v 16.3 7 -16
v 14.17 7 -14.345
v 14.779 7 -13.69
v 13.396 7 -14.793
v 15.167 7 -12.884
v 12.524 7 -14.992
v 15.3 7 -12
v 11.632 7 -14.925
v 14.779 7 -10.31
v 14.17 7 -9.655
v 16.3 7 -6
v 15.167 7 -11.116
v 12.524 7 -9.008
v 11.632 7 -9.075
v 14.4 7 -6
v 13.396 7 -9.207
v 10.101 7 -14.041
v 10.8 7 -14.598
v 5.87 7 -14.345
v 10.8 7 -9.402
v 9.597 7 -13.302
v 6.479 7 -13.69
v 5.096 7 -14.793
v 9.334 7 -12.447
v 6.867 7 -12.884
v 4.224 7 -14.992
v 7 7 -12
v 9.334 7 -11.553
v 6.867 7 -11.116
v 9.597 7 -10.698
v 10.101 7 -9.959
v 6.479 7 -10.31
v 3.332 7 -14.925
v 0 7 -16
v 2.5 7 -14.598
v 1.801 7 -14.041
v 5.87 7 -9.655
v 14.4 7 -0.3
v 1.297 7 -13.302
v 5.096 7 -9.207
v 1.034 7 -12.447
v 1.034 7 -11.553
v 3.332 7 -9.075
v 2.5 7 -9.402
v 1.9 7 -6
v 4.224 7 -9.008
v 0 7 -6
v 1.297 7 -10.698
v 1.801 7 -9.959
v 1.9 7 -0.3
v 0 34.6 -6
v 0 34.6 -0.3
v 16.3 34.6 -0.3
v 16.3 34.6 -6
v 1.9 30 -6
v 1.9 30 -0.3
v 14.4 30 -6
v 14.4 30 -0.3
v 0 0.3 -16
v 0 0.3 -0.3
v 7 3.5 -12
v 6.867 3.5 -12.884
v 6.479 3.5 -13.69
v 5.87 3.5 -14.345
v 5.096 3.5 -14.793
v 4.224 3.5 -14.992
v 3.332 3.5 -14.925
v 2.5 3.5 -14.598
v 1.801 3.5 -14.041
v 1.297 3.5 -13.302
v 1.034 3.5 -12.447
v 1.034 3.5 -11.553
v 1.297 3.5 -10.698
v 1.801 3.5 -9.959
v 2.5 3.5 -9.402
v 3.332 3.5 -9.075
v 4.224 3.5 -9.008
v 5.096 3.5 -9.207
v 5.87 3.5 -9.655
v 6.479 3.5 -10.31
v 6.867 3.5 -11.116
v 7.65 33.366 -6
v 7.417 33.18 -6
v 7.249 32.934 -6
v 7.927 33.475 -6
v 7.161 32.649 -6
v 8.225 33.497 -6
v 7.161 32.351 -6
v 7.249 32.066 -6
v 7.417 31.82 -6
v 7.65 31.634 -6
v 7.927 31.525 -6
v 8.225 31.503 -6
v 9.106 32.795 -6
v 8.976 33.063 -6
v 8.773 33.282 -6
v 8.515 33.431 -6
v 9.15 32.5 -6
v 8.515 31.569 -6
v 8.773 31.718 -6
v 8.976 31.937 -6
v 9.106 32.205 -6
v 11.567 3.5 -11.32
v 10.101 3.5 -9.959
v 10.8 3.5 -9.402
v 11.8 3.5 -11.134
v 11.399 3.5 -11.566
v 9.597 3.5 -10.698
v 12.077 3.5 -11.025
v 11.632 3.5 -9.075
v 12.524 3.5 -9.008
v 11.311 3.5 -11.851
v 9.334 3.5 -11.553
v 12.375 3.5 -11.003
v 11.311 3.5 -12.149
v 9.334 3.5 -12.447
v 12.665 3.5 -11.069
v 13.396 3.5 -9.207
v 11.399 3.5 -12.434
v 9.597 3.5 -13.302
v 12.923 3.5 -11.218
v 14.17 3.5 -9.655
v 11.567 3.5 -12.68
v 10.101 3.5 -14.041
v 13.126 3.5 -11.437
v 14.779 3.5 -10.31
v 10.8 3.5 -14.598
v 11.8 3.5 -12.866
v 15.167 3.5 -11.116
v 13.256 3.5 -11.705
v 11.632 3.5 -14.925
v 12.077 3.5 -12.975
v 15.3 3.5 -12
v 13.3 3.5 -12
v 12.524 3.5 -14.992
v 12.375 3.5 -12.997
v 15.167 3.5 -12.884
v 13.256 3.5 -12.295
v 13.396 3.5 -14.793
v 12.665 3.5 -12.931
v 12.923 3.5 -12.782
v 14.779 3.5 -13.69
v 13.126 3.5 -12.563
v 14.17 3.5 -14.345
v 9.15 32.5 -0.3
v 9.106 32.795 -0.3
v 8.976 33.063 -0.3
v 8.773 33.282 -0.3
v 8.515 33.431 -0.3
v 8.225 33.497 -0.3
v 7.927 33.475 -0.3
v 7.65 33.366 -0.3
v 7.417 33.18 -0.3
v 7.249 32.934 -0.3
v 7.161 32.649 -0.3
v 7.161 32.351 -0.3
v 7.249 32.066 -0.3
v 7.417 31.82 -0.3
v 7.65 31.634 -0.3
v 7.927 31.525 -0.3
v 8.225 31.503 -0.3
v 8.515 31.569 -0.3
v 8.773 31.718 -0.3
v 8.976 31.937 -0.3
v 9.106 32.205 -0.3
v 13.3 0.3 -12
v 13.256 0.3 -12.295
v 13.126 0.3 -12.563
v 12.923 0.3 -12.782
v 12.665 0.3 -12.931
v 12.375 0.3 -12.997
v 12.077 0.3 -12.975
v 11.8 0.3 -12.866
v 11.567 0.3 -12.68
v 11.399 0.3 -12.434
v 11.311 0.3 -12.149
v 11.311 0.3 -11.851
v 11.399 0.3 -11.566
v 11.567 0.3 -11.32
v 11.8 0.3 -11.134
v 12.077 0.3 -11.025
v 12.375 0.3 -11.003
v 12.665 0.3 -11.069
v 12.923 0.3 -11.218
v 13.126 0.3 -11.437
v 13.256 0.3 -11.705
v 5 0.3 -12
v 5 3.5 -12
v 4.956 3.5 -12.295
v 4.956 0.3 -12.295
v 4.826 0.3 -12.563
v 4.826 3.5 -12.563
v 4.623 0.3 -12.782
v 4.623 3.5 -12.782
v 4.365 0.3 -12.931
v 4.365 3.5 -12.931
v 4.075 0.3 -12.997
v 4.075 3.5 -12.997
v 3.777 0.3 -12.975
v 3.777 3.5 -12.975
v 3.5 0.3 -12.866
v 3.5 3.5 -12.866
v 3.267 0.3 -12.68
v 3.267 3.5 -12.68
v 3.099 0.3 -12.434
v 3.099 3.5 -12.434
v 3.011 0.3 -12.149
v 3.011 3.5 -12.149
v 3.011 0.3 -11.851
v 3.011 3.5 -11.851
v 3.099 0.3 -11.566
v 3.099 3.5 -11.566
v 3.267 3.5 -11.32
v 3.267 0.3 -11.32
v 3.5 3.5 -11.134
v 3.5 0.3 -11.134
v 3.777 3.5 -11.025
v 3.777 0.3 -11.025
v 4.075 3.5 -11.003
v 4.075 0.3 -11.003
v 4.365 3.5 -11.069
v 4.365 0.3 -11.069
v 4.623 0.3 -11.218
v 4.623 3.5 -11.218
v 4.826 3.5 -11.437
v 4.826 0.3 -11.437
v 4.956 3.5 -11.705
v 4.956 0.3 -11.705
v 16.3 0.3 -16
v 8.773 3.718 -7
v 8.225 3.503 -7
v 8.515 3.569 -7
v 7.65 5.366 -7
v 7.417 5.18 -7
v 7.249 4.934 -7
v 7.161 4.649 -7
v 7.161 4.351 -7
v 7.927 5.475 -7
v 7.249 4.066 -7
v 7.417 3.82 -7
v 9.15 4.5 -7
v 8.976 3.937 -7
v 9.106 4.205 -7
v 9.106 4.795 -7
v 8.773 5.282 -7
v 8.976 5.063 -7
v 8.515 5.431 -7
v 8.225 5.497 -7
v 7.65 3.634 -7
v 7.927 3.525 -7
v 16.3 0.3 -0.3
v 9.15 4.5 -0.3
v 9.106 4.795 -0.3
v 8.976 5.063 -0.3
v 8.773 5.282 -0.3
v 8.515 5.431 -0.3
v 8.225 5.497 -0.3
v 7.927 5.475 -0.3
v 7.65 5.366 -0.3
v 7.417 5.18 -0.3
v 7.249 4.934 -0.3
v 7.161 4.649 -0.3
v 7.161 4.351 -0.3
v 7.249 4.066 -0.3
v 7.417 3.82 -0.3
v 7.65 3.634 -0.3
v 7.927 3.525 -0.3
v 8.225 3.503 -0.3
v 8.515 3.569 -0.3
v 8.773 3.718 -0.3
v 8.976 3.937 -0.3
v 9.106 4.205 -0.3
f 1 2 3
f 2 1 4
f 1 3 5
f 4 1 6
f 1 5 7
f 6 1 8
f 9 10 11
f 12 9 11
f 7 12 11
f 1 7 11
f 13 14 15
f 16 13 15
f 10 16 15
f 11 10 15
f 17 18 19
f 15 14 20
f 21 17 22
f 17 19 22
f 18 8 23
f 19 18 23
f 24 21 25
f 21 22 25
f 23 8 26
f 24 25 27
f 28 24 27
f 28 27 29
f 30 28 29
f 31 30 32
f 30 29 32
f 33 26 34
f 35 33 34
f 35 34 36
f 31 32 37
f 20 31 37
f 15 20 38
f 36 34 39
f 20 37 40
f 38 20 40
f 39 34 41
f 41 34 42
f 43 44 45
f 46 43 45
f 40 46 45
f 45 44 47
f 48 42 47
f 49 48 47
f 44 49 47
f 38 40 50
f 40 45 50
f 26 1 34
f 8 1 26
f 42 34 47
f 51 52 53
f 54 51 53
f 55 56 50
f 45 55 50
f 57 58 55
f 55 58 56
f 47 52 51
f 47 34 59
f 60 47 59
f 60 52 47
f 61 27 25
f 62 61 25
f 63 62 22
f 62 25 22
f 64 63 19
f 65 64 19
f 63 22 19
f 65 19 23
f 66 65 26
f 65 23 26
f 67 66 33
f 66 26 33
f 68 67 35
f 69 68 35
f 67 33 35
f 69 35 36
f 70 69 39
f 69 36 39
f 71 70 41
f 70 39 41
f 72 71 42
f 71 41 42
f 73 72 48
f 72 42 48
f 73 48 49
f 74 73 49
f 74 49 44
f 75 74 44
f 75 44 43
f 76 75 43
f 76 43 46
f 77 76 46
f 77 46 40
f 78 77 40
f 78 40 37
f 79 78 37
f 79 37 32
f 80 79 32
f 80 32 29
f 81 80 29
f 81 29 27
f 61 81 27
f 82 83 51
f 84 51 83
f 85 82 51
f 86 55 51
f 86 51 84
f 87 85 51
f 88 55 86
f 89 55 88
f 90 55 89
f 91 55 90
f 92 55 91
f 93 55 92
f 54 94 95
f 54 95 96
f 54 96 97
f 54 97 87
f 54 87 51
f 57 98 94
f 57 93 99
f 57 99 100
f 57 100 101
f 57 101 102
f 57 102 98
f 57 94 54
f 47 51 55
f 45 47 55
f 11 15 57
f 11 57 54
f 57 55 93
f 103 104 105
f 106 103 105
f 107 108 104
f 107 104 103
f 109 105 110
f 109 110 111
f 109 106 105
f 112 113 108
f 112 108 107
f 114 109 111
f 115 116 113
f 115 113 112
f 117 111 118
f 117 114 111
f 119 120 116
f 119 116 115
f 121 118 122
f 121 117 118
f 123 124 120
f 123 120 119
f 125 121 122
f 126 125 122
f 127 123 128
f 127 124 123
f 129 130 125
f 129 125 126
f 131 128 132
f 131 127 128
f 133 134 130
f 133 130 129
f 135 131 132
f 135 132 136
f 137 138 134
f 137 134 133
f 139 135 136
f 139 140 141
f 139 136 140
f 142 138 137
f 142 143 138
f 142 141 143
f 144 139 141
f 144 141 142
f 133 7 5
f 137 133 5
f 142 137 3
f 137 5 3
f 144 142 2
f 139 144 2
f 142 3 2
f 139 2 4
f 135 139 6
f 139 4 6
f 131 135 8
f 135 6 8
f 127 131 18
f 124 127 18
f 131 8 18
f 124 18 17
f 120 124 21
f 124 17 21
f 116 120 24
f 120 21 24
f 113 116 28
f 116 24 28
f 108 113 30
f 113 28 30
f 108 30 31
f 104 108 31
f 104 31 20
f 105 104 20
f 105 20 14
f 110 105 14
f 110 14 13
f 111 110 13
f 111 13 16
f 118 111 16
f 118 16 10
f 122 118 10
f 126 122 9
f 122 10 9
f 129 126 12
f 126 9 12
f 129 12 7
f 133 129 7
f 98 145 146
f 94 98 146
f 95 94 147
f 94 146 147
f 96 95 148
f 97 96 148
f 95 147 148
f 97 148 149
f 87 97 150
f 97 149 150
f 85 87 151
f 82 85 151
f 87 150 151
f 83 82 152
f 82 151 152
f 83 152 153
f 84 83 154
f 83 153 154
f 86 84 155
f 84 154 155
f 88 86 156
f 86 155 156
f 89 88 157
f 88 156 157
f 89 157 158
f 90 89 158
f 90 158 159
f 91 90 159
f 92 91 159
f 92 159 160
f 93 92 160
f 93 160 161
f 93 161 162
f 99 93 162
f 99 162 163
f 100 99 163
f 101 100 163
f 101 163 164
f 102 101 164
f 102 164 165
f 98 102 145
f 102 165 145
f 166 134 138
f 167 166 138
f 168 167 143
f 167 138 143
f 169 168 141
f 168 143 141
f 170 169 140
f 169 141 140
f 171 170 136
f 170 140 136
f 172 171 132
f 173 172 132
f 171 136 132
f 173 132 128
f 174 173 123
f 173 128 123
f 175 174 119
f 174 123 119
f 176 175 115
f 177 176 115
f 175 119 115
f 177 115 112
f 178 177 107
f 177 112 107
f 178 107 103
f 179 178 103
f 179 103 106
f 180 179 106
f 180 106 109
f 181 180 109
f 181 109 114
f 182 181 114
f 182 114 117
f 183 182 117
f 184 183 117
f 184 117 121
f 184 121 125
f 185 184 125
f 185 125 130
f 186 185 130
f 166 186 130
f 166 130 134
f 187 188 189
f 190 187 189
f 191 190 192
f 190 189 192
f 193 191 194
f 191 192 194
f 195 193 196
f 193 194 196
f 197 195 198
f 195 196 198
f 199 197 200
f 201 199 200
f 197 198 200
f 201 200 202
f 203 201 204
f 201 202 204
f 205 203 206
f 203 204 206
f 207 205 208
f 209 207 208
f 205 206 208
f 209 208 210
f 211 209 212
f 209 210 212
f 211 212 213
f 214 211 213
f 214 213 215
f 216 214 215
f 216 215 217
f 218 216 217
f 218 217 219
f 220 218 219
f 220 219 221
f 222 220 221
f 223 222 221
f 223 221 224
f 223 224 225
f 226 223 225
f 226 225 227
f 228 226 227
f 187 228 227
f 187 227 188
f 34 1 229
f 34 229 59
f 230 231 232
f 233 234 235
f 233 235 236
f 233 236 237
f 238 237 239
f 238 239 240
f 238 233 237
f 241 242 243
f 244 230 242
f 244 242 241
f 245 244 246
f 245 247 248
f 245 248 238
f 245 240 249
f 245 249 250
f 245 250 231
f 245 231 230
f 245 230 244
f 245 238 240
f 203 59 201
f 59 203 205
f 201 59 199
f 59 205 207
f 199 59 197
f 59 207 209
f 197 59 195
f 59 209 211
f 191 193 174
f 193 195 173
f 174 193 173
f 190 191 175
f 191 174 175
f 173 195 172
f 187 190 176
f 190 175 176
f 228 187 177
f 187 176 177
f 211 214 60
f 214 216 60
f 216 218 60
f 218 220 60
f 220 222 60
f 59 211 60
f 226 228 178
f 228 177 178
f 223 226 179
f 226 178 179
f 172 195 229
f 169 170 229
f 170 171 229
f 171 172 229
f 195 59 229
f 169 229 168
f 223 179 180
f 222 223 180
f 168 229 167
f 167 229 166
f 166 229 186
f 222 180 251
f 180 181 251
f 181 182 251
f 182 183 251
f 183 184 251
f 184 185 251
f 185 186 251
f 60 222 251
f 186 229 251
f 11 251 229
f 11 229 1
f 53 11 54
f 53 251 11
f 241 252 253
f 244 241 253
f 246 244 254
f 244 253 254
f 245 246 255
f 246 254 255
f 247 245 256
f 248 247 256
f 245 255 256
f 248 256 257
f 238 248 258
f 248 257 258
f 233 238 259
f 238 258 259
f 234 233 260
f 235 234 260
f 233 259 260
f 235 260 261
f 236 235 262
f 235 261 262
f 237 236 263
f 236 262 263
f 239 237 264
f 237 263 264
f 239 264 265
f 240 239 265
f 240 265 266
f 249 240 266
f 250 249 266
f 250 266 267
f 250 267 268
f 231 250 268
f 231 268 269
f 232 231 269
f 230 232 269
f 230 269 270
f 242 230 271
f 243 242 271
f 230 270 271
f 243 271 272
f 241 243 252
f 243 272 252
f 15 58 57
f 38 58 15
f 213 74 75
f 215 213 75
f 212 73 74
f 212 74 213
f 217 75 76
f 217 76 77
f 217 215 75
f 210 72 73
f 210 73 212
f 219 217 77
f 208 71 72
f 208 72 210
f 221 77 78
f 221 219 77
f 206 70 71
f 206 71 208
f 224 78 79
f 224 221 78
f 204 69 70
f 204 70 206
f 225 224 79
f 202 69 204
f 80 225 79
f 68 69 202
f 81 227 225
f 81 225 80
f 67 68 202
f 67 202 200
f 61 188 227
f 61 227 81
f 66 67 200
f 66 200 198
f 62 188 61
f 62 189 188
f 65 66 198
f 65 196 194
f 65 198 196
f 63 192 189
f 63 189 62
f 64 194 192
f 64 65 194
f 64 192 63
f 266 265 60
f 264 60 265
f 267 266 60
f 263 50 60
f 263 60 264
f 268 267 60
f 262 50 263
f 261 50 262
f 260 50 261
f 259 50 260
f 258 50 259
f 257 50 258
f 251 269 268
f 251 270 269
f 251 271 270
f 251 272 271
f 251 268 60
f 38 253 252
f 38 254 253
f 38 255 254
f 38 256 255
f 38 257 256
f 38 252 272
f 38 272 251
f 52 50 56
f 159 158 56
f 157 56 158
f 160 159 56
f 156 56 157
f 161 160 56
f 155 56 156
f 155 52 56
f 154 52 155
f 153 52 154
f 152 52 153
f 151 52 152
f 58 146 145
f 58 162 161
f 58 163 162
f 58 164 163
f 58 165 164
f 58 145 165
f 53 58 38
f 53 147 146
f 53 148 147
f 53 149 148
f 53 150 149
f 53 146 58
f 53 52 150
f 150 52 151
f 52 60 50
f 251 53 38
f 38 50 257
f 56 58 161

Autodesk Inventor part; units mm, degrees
ref_plane "YZ Plane" through (0, 0, 0) normal (1, 0, 0) x (0, 1, 0)
ref_plane "XZ Plane" through (0, 0, 0) normal (0, 1, 0) x (-1, 0, 0)
ref_plane "XY Plane" through (0, 0, 0) normal (0, 0, 1) x (1, 0, 0)
sketch "Sketch1" plane through (0, 0, 0) normal (1, 0, 0) x (0, 1, 0)
  line L0 (34.6, 0) -> (0, 0)
  line L1 (0, 0) -> (0, -40)
  line L2 (7, -40) -> (7, -5)
  line L3 (7, -5) -> (34.6, -5)
  line L4 (34.6, -5) -> (34.6, 0)
  line L5 (7, -40) -> (0, -40)
  dimension "d0" = 0
  dimension "d1" = 0
  dimension "d2" = 5
  dimension "d3" = 7
  dimension "d5" = 40
  dimension "d6" = 34.6
extrude "Extrusion1" add sketch "Sketch1" along normal blind 16.3
sketch "Sketch2" plane through (0, 7, -5) normal (0, 1, 0) x (1, 0, 0)
  circle A0 centre (8.15, 20) radius 1.5
  line L0 (16.3, 35) -> (16.3, 0) projected
  line L1 (0, -5) -> (16.3, -5) projected
  circle A1 centre (8.15, 28) radius 1.5
  line L2 (8.15, 20) -> (8.15, 28) construction
  dimension "d9" = 8.15
  dimension "d10" = 25
  dimension "d11" = 3
  dimension "d31" = 3
  dimension "d32" = 8
extrude "Extrusion2" cut sketch "Sketch2" against normal through all
sketch "Sketch3" plane through (0, 7, -5) normal (0, 0, -1) x (-1, 0, 0)
  line L0 (0, 0) -> (-16.3, 0) projected
  line L1 (-14.4, 0) -> (-1.9, 0)
  line L2 (-1.9, 0) -> (-1.9, 23)
  line L3 (-1.9, 23) -> (-14.4, 23)
  line L4 (-14.4, 23) -> (-14.4, 0)
  line L5 (0, 0) -> (0, 27.6) projected
  point P0 (0, -7)
  dimension "d14" = 23
  dimension "d15" = 12.5
  dimension "d16" = 1.9
extrude "Extrusion3" cut sketch "Sketch3" against normal blind 16.3
sketch "Sketch5" plane through (0, 7, -5) normal (0, 0, -1) x (-1, 0, 0)
  line L0 (0, 27.6) -> (-16.3, 27.6) projected
  line L1 (-16.3, 27.6) -> (0, 27.6)
  line L2 (0, 27.6) -> (0, 0)
  line L3 (0, 0) -> (-1.9, 0)
  line L4 (-14.4, 23) -> (-14.4, 0) projected
  line L5 (-14.4, 23) -> (-14.4, 0)
  line L6 (-14.4, 0) -> (-16.3, 0)
  line L7 (-16.3, 0) -> (-16.3, 27.6)
  line L8 (-14.4, 23) -> (-1.9, 23)
  line L9 (-1.9, 23) -> (-1.9, 0)
  line L10 (-1.9, 23) -> (-1.9, 0) projected
  line L11 (-14.4, 23) -> (-1.9, 23) projected
  point P0 (0, -7)
  dimension "d26" = 0
  dimension "d27" = 0
  dimension "d28" = 1.9
extrude "Extrusion5" add sketch "Sketch5" along normal blind 4
sketch "Sketch4" plane through (0, 0, 0) normal (0, 0, 1) x (1, 0, 0)
  circle A0 centre (8.15, 32.5) radius 1
  circle A1 centre (8.15, 4.5) radius 1
  line L0 (1.9, 30) -> (14.4, 30) projected
  line L1 (14.4, 7) -> (1.9, 7) projected
  line L2 (0, 34.6) -> (0, 0) projected
  line L3 (16.3, 34.6) -> (16.3, 0) projected
  dimension "d19" = 2.5
  dimension "d20" = 2.5
  dimension "d21" = 2
  dimension "d22" = 8.15
  dimension "d23" = 8.15
extrude "Extrusion4" cut sketch "Sketch4" against normal blind 7
sketch "Sketch6" plane through (0, 7, -40) normal (0, 1, 0) x (1, 0, 0)
  circle A0 centre (12.3, -28) radius 1
  line L0 (0, -40) -> (16.3, -40) projected
  line L1 (16.3, -40) -> (16.3, -31) projected
  circle A1 centre (4, -28) radius 1
  line L2 (0, 0) -> (0, -31) projected
  dimension "d33" = 2
  dimension "d34" = 12
  dimension "d35" = 4
  dimension "d38" = 4
  dimension "d39" = 0
extrude "Extrusion6" cut sketch "Sketch6" against normal blind 10
sketch "Sketch7" plane through (0, 7, -40) normal (0, 1, 0) x (1, 0, 0)
  line L0 (0, 0) -> (0, -31) projected
  line L1 (0, 0) -> (16.3, 0)
  line L2 (16.3, 0) -> (16.3, -24)
  line L3 (16.3, -24) -> (0, -24)
  line L4 (0, -24) -> (0, 0)
  line L5 (0, -40) -> (16.3, -40) projected
  line L6 (16.3, 0) -> (16.3, -31) projected
  point P0 (8.15, -24)
  point P1 (0, -24)
  dimension "d40" = 16
  dimension "d41" = 0
extrude "Extrusion7" cut sketch "Sketch7" against normal blind 10
sketch "Sketch8" plane through (1.9, 7, 0) normal (0, 1, 0) x (1, 0, 0)
  line L0 (14.4, 16) -> (14.4, 9) projected
  line L1 (-1.9, 0) -> (-1.9, 16) projected
  line L2 (14.4, 9) -> (-1.9, 9)
  line L3 (-1.9, 9) -> (-1.9, 6)
  line L4 (-1.9, 6) -> (14.4, 6)
  line L5 (14.4, 6) -> (14.4, 9)
  point P0 (-1.9, 9)
  dimension "d44" = 3
extrude "Extrusion8" cut sketch "Sketch8" along normal up to surface (27.6 mm away)
sketch "Sketch9" plane through (1.9, 7, 0) normal (0, 1, 0) x (1, 0, 0)
  circle A0 centre (10.4, 12) radius 1 projected
  circle A1 centre (10.4, 12) radius 3
  circle A2 centre (2.1, 12) radius 1 projected
  circle A3 centre (2.1, 12) radius 3
  point P0 (-1.9, 0)
  dimension "d47" = 6
  dimension "d48" = 6
extrude "Extrusion9" cut sketch "Sketch9" against normal blind 3.5
sketch "Sketch10" plane through (0, 34.6, 0) normal (0, 1, 0) x (1, 0, 0)
  line L0 (0, 0) -> (16.3, 0) projected
  line L1 (0, 0) -> (0, 16) projected
  line L2 (16.3, 0) -> (0, 0)
  line L3 (0, 0) -> (0, 0.3)
  line L4 (0, 0.3) -> (16.3, 0.3)
  line L5 (16.3, 0.3) -> (16.3, 0)
  dimension "d51" = 0.3
extrude "Extrusion10" cut sketch "Sketch10" against normal up to surface (34.6 mm away)
sketch "Sketch11" plane through (16.3, 0, 0) normal (1, 0, 0) x (0, 0, -1)
  line L0 (0.3, 0) -> (16, 0) projected
  line L1 (16, 7) -> (16, 0) projected
  line L2 (0.3, 0) -> (16, 0)
  line L3 (16, 0) -> (16, 0.3)
  line L4 (16, 0.3) -> (0.3, 0.3)
  line L5 (0.3, 0.3) -> (0.3, 0)
  point P0 (0, 0)
  dimension "d54" = 0.3
extrude "Extrusion11" cut sketch "Sketch11" against normal up to surface (16.3 mm away)
properties part number "ServoHolder_3DPrint"
